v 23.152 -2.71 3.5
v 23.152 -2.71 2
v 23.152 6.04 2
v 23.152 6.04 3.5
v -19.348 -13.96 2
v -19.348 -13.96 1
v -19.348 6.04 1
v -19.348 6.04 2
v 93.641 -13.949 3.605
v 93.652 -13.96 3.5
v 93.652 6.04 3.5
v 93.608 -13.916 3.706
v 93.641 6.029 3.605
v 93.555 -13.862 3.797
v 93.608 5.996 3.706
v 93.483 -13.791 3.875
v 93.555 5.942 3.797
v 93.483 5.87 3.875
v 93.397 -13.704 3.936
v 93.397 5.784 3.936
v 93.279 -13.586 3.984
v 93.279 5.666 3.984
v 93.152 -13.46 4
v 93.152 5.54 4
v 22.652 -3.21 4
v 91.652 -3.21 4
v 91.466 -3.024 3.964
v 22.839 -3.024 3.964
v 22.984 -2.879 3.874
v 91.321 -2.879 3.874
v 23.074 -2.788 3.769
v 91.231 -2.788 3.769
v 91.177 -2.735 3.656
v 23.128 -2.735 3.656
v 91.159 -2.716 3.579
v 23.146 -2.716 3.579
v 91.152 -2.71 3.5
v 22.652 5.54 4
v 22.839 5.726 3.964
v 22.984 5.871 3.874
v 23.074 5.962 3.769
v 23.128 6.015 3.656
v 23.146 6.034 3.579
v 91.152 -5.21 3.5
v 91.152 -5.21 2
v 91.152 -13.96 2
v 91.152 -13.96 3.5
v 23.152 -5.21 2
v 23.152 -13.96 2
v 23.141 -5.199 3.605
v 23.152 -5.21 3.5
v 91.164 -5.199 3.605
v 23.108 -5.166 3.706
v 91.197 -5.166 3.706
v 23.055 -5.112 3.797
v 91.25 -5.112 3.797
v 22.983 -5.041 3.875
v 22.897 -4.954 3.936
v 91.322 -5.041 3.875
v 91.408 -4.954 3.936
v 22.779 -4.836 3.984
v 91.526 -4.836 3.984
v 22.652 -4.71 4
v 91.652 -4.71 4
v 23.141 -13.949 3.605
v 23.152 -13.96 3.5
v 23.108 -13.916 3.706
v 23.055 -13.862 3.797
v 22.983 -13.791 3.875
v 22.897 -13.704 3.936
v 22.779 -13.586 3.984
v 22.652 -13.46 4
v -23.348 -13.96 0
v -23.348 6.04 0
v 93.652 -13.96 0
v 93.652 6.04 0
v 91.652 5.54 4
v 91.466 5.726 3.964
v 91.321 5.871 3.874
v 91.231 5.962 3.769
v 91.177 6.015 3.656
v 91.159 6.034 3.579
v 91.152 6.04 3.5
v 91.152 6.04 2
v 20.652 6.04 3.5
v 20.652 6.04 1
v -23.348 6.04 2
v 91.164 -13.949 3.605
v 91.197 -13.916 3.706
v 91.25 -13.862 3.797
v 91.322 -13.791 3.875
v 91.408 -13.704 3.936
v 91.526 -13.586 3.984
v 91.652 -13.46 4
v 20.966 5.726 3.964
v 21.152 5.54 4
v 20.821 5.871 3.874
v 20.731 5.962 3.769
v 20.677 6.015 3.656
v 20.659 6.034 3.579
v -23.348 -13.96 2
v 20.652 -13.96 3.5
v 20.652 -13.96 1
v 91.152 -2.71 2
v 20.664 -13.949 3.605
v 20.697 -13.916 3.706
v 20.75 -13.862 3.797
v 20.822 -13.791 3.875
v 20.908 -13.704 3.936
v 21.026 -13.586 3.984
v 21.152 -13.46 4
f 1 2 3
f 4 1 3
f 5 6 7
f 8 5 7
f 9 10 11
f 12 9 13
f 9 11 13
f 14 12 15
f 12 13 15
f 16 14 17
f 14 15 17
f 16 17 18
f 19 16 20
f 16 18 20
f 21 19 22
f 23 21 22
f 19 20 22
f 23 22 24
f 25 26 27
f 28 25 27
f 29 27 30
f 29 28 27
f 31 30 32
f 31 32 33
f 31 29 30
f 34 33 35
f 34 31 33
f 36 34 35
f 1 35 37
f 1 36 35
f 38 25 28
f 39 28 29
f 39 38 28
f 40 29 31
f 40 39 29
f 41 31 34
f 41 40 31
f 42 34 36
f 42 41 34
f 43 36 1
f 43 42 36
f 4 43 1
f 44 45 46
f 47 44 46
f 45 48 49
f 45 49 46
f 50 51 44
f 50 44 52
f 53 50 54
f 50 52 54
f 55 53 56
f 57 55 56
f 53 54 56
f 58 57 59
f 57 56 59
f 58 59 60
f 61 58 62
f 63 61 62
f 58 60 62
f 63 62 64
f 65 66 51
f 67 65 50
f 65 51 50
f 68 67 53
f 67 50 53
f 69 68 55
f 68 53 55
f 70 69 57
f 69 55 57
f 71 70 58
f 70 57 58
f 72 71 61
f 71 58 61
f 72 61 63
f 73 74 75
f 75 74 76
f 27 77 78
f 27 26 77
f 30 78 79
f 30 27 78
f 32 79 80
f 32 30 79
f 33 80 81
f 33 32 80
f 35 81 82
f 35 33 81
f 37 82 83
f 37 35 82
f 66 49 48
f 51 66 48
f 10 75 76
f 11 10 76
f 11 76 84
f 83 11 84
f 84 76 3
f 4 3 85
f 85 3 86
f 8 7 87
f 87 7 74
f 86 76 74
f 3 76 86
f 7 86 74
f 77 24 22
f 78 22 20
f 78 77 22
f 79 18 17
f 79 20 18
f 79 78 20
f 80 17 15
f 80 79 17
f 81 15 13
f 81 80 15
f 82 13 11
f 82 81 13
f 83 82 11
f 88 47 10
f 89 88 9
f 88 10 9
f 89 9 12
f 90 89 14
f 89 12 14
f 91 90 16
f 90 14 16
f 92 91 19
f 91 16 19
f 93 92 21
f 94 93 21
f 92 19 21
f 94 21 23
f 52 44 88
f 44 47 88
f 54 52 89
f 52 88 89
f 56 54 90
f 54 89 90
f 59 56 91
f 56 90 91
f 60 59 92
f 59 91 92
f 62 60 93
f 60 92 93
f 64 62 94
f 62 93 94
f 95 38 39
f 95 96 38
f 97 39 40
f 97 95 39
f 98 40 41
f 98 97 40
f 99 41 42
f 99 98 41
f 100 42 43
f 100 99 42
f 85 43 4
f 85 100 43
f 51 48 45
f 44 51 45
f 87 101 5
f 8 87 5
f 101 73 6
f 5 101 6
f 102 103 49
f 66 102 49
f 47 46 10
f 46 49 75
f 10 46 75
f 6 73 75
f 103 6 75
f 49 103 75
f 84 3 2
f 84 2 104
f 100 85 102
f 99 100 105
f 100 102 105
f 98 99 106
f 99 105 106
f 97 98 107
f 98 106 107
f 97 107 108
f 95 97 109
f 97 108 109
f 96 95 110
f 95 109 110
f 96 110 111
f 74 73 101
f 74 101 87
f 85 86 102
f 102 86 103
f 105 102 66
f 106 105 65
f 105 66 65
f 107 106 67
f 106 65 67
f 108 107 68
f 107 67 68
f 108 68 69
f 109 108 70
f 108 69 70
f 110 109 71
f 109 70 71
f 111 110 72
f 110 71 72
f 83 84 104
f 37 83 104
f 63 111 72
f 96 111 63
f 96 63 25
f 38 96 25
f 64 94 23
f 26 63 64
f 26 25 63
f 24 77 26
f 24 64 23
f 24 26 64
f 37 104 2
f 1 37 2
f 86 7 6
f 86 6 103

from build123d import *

# Parameters (mm, degrees)
F0_W     = 40
F0_H     = 20
F1_DEPTH = 1
F0_W_2   = 4
F0_W_3   = 69
F2_DEPTH = 2
F4_DEPTH = 2
F5_R     = 0.5


with BuildPart() as f1:
    # F0 (on Top) → F1 (new body)
    with BuildSketch(Plane.XY):
        with Locations((0.652443, -3.960167)):
            Rectangle(F0_W, F0_H)
    extrude(amount=F1_DEPTH)

    # F0 (on Top) → F2 (join)
    with BuildSketch(Plane.XY):
        with Locations((22.652443, -3.960167)):
            Rectangle(F0_W_2, F0_H)
        with Locations((-21.347557, -3.960167)):
            Rectangle(F0_W_2, F0_H)
        with Locations((59.152443, -3.960167)):
            Rectangle(F0_W_3, F0_H)
    extrude(amount=F2_DEPTH)

    # F3 (on face) → F4 (join)
    with BuildSketch(Plane.XY.offset(2)):
        Polygon((20.652443, 6.039833), (20.652443, -13.960167), (23.152443, -13.960167), (23.152443, -5.210167), (91.152443, -5.210167), (91.152443, -13.960167), (93.652443, -13.960167), (93.652443, 6.039833), (91.152443, 6.039833), (91.152443, -2.710167), (23.152443, -2.710167), (23.152443, 6.039833), align=None)
    extrude(amount=F4_DEPTH)

    # F5
    f5_edges = [f1.edges().sort_by_distance(p)[0] for p in [
        (21.902443, 6.039833, 4),
        (20.652443, -3.960167, 4),
        (21.902443, -13.960167, 4),
        (23.152443, -9.585167, 4),
        (57.152443, -5.210167, 4),
        (91.152443, -9.585167, 4),
        (92.402443, -13.960167, 4),
        (93.652443, -3.960167, 4),
        (92.402443, 6.039833, 4),
        (91.152443, 1.664833, 4),
        (57.152443, -2.710167, 4),
        (23.152443, 1.664833, 4),
    ]]
    fillet(f5_edges, radius=F5_R)


solid = f1.part
